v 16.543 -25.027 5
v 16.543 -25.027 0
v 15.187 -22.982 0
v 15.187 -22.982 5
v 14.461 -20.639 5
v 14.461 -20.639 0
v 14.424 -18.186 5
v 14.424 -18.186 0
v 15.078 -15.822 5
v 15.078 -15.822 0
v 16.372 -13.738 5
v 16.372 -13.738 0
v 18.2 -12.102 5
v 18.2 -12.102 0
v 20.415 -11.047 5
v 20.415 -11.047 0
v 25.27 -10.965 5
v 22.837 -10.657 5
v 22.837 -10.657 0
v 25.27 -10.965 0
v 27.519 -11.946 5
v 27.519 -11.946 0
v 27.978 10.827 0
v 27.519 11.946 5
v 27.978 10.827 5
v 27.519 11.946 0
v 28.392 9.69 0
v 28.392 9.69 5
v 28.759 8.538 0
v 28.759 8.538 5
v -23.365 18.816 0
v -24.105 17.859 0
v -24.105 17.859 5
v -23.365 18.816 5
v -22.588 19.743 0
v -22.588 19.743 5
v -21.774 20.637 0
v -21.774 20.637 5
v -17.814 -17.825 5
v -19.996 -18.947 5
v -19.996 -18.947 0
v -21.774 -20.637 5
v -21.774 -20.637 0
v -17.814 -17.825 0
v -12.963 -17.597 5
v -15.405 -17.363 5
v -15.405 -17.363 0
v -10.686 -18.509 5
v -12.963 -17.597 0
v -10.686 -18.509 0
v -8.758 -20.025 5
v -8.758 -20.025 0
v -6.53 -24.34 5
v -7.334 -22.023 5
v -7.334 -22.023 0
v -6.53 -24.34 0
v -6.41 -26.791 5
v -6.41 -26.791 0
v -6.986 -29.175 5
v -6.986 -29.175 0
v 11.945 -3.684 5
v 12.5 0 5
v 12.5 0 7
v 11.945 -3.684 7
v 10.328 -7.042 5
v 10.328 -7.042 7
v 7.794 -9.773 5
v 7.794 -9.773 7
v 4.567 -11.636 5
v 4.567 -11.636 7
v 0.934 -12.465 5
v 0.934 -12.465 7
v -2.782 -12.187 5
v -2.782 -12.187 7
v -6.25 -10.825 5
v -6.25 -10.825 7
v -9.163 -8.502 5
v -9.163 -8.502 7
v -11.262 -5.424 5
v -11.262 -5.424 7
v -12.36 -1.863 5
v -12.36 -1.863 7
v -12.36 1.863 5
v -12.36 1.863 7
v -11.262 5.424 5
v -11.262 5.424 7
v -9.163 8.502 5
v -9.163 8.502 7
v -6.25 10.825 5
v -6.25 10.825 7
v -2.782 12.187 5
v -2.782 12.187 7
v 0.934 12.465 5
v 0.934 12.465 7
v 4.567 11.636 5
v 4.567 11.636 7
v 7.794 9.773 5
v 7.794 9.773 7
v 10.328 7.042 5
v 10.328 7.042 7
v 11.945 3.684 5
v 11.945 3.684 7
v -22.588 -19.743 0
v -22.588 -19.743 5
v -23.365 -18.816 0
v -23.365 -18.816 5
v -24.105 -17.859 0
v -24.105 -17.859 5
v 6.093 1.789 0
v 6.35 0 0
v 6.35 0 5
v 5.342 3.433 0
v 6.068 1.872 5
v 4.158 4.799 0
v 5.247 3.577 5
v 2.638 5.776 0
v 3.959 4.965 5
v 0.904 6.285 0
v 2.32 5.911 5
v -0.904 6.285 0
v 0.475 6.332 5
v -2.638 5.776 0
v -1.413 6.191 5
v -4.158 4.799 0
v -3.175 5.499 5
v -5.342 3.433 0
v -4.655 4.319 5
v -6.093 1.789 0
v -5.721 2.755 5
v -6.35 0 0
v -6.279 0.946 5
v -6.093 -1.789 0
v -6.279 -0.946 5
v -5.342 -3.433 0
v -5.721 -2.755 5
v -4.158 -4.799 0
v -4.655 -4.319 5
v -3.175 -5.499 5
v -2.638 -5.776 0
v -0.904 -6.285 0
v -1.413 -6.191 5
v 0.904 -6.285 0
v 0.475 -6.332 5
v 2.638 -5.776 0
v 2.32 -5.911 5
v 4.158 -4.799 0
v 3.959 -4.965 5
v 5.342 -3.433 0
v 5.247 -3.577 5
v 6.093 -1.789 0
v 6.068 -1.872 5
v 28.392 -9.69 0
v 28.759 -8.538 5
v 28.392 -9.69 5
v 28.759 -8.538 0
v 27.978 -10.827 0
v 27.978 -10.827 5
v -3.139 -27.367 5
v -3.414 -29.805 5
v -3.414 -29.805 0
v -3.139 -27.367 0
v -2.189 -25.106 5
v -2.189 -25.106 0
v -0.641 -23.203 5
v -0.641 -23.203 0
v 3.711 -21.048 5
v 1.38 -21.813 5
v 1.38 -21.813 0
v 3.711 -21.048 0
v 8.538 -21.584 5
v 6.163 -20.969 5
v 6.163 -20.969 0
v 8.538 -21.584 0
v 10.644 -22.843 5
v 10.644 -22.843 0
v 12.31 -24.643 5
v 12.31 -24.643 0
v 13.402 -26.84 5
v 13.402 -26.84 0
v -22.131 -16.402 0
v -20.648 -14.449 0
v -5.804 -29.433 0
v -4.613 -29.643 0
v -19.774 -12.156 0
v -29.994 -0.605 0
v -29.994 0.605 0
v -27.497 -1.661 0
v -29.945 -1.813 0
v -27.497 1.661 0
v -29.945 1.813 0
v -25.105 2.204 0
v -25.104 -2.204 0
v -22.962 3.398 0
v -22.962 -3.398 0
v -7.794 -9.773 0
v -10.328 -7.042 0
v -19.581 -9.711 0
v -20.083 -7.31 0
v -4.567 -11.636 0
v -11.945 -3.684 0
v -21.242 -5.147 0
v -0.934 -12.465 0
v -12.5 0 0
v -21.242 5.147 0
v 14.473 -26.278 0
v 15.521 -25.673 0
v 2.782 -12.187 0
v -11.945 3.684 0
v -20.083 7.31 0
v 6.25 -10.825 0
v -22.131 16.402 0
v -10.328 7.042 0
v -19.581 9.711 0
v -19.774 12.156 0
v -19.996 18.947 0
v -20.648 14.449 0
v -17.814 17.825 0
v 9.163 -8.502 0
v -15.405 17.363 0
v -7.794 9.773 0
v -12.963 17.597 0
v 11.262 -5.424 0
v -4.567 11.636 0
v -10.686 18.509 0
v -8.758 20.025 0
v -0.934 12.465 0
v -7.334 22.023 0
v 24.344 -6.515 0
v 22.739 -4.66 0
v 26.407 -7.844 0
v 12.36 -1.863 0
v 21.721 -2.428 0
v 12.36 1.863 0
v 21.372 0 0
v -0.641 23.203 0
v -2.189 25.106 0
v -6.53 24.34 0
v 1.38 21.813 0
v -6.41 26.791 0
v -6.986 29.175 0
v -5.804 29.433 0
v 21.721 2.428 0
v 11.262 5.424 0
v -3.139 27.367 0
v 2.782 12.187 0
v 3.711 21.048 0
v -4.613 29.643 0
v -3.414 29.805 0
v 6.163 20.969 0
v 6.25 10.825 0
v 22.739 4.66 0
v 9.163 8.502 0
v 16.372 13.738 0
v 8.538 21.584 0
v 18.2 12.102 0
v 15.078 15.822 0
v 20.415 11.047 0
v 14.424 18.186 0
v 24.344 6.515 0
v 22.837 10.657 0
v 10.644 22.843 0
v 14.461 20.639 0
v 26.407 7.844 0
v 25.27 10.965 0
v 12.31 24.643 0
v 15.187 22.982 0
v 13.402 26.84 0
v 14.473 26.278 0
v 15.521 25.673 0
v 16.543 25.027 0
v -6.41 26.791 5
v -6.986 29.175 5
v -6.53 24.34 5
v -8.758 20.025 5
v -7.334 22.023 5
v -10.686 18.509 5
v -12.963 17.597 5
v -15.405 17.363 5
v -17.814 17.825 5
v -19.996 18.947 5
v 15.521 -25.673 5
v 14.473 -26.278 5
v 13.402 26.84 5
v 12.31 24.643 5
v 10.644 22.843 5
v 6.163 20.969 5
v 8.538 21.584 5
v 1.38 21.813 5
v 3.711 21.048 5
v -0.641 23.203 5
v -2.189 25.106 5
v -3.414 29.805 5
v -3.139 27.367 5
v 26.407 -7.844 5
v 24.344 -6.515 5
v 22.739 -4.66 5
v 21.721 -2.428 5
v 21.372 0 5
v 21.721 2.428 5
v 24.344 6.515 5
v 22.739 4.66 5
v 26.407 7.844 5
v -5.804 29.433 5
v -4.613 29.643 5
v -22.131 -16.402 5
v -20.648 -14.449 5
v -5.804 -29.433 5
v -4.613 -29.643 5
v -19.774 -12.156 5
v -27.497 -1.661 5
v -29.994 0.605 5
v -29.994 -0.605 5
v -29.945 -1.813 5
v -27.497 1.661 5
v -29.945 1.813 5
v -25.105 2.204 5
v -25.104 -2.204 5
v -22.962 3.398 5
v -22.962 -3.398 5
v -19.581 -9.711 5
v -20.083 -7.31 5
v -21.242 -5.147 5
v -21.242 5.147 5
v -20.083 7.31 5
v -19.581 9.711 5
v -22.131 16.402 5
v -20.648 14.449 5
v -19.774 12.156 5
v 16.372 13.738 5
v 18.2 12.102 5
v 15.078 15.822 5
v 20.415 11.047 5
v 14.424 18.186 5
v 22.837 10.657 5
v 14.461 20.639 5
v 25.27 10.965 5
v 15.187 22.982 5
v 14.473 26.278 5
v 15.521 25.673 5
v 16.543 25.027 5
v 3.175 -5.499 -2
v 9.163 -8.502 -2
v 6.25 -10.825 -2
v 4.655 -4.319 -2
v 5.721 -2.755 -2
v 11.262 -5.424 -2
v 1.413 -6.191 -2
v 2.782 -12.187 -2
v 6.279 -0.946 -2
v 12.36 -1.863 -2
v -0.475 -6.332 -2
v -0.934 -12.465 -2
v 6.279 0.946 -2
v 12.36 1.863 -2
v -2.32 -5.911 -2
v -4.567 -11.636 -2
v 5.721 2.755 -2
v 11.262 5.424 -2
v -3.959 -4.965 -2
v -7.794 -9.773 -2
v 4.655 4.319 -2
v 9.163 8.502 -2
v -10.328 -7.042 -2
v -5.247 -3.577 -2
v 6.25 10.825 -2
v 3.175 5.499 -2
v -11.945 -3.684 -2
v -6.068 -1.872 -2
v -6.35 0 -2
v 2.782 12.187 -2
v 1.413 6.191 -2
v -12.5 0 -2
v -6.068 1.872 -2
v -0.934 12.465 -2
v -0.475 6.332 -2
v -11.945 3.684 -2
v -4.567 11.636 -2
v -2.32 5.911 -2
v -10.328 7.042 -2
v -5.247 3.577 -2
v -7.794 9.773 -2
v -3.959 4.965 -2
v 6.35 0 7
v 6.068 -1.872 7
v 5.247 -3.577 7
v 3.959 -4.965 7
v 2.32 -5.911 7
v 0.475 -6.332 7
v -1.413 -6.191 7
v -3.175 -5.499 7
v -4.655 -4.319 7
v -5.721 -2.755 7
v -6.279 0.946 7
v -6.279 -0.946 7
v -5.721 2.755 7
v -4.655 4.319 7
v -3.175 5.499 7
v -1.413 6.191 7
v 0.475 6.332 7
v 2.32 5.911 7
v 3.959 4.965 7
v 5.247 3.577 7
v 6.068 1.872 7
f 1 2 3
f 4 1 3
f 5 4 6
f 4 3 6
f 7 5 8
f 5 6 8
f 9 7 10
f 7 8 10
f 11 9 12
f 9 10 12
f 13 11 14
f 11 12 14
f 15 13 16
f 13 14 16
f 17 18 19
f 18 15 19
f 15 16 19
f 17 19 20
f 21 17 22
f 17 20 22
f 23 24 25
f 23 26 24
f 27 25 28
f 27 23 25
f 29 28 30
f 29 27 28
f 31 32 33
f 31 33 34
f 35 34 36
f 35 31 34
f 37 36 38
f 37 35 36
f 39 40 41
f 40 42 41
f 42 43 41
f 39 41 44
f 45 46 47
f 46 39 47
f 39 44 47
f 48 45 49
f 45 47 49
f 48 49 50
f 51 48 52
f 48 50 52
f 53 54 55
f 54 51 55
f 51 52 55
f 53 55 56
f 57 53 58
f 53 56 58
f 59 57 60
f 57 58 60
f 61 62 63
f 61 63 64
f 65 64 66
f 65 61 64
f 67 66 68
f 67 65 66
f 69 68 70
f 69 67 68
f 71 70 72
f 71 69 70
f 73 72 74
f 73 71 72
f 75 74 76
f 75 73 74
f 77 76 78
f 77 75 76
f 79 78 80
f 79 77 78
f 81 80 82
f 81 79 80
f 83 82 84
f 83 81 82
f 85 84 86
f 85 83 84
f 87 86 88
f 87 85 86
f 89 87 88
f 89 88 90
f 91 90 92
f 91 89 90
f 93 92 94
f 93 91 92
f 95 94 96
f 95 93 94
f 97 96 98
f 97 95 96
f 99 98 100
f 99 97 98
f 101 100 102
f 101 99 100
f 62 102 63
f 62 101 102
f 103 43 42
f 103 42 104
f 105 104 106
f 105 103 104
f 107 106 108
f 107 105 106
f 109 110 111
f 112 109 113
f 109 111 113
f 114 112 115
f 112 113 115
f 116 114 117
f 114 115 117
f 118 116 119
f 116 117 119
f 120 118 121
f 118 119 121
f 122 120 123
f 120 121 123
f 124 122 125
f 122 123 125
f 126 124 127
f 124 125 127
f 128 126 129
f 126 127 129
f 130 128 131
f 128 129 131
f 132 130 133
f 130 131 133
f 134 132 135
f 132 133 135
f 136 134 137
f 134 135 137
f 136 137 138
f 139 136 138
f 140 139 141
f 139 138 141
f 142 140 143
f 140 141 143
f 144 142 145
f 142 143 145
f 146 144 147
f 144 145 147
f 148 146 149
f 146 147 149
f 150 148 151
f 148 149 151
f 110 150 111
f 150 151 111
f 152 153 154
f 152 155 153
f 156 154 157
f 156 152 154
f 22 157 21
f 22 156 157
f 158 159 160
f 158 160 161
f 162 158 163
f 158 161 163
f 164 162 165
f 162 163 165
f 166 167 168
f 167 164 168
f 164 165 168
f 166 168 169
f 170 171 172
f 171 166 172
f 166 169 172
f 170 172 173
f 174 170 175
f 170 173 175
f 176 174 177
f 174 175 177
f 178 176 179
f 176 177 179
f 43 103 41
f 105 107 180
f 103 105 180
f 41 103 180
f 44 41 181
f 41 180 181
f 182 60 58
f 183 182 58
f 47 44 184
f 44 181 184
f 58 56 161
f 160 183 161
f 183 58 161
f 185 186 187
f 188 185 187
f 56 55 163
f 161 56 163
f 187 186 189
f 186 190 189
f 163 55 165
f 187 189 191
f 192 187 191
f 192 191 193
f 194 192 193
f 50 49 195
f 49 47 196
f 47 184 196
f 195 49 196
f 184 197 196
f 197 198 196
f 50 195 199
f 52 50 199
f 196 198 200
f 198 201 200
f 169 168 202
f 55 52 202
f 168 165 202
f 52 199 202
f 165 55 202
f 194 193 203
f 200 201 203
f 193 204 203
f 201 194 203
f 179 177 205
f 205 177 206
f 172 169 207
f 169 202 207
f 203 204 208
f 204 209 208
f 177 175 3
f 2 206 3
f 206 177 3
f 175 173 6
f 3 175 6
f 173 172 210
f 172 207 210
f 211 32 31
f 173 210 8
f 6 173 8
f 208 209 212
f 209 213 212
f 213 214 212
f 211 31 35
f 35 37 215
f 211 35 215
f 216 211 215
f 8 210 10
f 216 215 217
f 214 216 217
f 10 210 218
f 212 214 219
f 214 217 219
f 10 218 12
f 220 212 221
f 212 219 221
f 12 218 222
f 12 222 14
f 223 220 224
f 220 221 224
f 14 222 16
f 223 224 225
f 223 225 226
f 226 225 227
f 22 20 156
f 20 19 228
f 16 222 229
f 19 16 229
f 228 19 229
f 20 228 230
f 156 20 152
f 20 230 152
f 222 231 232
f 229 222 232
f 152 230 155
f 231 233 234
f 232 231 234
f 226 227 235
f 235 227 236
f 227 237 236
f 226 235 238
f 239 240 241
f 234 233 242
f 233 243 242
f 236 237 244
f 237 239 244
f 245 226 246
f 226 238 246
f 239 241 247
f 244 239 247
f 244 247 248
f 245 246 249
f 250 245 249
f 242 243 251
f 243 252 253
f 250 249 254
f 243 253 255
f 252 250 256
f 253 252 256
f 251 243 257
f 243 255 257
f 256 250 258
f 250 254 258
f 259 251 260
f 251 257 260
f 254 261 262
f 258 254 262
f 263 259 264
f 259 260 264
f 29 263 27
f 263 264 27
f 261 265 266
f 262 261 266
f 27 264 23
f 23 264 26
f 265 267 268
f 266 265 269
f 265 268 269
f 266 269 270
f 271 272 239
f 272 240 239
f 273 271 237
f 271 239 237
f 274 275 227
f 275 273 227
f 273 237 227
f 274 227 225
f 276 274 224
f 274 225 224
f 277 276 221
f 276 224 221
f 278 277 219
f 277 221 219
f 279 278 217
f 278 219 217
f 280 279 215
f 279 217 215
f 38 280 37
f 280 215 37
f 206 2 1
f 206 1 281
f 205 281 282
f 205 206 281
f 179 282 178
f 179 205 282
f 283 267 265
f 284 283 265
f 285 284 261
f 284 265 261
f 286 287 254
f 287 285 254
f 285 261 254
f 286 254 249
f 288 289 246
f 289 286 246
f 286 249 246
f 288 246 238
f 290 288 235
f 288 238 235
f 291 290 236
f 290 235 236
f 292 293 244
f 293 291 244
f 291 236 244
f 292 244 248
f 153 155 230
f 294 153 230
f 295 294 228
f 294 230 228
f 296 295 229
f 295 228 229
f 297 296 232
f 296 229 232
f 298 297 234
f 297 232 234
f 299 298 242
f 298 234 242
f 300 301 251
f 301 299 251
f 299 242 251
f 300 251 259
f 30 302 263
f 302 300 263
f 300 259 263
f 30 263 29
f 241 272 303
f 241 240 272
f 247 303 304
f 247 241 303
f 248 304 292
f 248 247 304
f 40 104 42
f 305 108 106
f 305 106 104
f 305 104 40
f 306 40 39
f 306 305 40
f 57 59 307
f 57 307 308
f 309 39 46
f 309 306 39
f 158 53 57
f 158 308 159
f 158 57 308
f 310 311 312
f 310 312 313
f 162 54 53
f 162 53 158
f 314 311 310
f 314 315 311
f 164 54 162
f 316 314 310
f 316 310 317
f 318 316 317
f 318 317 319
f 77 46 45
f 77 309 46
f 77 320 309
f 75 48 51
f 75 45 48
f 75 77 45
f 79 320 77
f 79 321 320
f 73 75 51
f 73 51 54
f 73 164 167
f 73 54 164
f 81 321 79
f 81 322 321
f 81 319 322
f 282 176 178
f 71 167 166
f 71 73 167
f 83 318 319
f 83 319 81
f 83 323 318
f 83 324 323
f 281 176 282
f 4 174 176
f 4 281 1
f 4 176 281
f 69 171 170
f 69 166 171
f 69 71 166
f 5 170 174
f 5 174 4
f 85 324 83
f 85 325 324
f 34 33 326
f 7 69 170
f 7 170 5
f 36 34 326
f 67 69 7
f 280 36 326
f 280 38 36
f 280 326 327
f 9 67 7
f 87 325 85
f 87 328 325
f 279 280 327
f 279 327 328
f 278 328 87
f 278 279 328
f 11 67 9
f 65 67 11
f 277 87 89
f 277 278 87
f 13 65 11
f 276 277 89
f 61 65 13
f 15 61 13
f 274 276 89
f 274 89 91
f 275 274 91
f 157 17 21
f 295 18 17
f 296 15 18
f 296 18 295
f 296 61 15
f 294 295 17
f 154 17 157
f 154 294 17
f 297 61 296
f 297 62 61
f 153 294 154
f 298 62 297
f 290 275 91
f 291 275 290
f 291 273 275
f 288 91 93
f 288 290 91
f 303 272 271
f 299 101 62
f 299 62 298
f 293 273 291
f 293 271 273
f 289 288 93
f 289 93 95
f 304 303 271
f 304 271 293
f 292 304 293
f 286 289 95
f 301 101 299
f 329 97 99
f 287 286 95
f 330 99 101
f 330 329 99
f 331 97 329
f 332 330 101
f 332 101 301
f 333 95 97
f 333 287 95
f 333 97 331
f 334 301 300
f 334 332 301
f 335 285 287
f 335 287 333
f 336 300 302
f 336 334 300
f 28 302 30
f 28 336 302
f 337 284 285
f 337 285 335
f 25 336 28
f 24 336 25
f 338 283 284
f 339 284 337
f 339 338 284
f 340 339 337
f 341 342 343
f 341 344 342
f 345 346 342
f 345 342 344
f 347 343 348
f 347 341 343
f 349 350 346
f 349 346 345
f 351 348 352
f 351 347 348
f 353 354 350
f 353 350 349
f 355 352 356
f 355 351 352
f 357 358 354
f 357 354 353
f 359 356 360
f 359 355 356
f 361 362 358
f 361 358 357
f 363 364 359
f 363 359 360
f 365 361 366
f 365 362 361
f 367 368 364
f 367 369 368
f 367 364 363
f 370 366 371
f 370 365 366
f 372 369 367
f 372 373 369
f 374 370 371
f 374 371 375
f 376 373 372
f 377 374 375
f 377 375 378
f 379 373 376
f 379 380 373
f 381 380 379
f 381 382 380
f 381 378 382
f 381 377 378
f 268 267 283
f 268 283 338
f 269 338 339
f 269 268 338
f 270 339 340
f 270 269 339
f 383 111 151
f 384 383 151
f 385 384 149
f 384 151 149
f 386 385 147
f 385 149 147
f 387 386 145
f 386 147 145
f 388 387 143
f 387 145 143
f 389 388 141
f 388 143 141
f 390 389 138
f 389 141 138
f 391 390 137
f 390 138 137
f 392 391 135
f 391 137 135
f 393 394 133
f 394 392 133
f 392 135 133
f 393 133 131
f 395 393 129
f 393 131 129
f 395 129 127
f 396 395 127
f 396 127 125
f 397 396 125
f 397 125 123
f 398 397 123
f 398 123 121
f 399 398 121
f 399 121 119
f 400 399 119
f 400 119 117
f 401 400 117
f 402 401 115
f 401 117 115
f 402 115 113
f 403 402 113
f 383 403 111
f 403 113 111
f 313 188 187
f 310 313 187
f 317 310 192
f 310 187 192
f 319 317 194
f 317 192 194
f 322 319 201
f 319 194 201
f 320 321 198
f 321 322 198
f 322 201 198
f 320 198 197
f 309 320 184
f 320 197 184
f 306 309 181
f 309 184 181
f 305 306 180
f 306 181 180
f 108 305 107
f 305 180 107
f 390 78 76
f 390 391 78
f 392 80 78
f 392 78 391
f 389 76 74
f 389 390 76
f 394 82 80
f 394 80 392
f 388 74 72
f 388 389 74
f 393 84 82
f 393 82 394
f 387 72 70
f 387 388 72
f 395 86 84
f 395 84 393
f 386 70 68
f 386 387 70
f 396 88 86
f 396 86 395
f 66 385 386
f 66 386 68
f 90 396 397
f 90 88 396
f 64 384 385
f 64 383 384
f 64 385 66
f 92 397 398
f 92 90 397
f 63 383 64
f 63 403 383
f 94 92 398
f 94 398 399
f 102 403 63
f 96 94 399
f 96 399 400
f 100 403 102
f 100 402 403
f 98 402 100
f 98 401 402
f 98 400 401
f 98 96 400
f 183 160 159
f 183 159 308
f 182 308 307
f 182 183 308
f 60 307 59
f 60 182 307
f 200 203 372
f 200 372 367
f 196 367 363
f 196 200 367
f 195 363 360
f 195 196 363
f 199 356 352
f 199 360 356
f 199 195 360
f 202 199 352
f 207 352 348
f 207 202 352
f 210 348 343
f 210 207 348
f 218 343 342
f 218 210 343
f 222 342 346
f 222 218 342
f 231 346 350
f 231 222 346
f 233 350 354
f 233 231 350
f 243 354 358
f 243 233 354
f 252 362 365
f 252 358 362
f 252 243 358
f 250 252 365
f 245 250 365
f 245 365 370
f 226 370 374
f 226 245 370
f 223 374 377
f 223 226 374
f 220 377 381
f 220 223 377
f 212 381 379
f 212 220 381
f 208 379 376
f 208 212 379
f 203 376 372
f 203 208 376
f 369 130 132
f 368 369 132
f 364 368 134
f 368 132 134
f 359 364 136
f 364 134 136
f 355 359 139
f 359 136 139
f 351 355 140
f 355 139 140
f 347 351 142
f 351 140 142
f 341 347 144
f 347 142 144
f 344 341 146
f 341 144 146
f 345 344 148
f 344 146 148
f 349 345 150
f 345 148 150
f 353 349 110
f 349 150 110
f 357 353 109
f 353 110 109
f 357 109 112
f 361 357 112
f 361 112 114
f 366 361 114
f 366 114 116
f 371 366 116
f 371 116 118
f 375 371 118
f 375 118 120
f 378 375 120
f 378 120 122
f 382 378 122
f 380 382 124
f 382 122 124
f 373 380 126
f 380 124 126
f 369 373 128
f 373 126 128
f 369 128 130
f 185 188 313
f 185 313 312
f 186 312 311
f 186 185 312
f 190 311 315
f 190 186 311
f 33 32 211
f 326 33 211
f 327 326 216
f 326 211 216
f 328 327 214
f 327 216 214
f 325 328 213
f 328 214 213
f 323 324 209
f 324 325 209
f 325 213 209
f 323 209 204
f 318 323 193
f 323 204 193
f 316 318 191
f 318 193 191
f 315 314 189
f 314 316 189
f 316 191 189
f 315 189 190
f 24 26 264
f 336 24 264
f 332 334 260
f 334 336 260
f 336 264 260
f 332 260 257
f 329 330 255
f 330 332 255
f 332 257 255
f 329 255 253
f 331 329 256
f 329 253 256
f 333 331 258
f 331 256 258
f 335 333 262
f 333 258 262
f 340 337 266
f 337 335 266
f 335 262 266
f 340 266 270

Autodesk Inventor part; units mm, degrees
ref_plane "YZ Plane" through (0, 0, 0) normal (1, 0, 0) x (0, 1, 0)
ref_plane "XZ Plane" through (0, 0, 0) normal (0, 1, 0) x (-1, 0, 0)
ref_plane "XY Plane" through (0, 0, 0) normal (0, 0, 1) x (1, 0, 0)
sketch "Sketch1" plane through (0, 0, 0) normal (0, 0, 1) x (1, 0, 0)
  circle A0 centre (0, 0) radius 6.35
  circle A1 centre (0, 0) radius 21.3337
  arc A2 (28.7594, 8.538) -> (28.7594, -8.538) centre (30, 0) ccw
  arc A3 (16.5428, 25.0267) -> (27.5191, 11.9457) centre (22.9813, 19.2836) ccw
  arc A4 (-3.4143, 29.8051) -> (13.4023, 26.8399) centre (5.2094, 29.5442) ccw
  arc A5 (-21.7738, 20.6373) -> (-6.9856, 29.1754) centre (-15, 25.9808) ccw
  arc A6 (-29.9452, 1.8132) -> (-24.1048, 17.8594) centre (-28.1908, 10.2606) ccw
  arc A7 (-24.1048, -17.8594) -> (-29.9452, -1.8132) centre (-28.1908, -10.2606) ccw
  arc A8 (-6.9856, -29.1754) -> (-21.7738, -20.6373) centre (-15, -25.9808) ccw
  arc A9 (13.4023, -26.8399) -> (-3.4143, -29.8051) centre (5.2094, -29.5442) ccw
  arc A10 (27.5191, -11.9457) -> (16.5428, -25.0267) centre (22.9813, -19.2836) ccw
  arc A11 (27.5191, -11.9457) -> (28.7594, -8.538) centre (0, 0) ccw
  arc A12 (28.7594, 8.538) -> (27.5191, 11.9457) centre (0, 0) ccw
  arc A13 (16.5428, 25.0267) -> (13.4023, 26.8399) centre (0, 0) ccw
  arc A14 (-3.4143, 29.8051) -> (-6.9856, 29.1754) centre (0, 0) ccw
  arc A15 (-21.7738, 20.6373) -> (-24.1048, 17.8594) centre (0, 0) ccw
  arc A16 (-29.9452, 1.8132) -> (-29.9452, -1.8132) centre (0, 0) ccw
  arc A17 (-24.1048, -17.8594) -> (-21.7738, -20.6373) centre (0, 0) ccw
  arc A18 (-6.9856, -29.1754) -> (-3.4143, -29.8051) centre (0, 0) ccw
  arc A19 (13.4023, -26.8399) -> (16.5428, -25.0267) centre (0, 0) ccw
  arc A20 (-6.3913, -25.4085) -> (-2.6843, -26.0621) centre (0, 0) ccw
  point P0 (25.2001, -7.1692)
  point P1 (25.2001, 7.1692)
  point P2 (23.9126, 10.7064)
  point P3 (14.6961, 21.6902)
  point P4 (11.4362, 23.5723)
  point P5 (-2.6843, 26.0621)
  point P6 (-6.3913, 25.4085)
  point P7 (-18.8087, 18.2393)
  point P8 (-21.2283, 15.3558)
  point P9 (-26.1323, 1.8821)
  point P10 (-26.1323, -1.8821)
  point P11 (-21.2283, -15.3558)
  point P12 (-18.8087, -18.2393)
  point P13 (11.4362, -23.5723)
  point P14 (23.9126, -10.7064)
  point P15 (14.6961, -21.6902)
  dimension "d1" = 12.7
  dimension "d5" = 360
extrude "Extrusion1" add sketch "Sketch1" along normal blind 5 contours A0 | A1 | A2 A11 A10 A19 A9 A20 A8 A17 A7 A16 A6 A15 A5 A14 A4 A13 A3 A12 | A9 A18 A8 A20
sketch "Sketch2" plane through (0, 0, 5) normal (0, 0, 1) x (1, 0, 0)
  circle A0 centre (0, 0) radius 6.35
  dimension "d9" = 12.7
extrude "Extrusion2" cut sketch "Sketch2" against normal through all
sketch "Sketch3" plane through (0, 0, 5) normal (0, 0, 1) x (1, 0, 0)
  circle A0 centre (0, 0) radius 12.5
  circle A1 centre (0, 0) radius 6.35
  dimension "d12" = 25
  dimension "d13" = 12.7
extrude "Extrusion3" add sketch "Sketch3" along normal blind 2
sketch "Sketch4" plane through (0, 0, 0) normal (0, 0, -1) x (-1, 0, 0)
  circle A0 centre (0, 0) radius 6.35
  circle A1 centre (0, 0) radius 12.5
  dimension "d16" = 12.7
  dimension "d17" = 25
extrude "Extrusion4" add sketch "Sketch4" along normal blind 2
properties part number "Gear"
